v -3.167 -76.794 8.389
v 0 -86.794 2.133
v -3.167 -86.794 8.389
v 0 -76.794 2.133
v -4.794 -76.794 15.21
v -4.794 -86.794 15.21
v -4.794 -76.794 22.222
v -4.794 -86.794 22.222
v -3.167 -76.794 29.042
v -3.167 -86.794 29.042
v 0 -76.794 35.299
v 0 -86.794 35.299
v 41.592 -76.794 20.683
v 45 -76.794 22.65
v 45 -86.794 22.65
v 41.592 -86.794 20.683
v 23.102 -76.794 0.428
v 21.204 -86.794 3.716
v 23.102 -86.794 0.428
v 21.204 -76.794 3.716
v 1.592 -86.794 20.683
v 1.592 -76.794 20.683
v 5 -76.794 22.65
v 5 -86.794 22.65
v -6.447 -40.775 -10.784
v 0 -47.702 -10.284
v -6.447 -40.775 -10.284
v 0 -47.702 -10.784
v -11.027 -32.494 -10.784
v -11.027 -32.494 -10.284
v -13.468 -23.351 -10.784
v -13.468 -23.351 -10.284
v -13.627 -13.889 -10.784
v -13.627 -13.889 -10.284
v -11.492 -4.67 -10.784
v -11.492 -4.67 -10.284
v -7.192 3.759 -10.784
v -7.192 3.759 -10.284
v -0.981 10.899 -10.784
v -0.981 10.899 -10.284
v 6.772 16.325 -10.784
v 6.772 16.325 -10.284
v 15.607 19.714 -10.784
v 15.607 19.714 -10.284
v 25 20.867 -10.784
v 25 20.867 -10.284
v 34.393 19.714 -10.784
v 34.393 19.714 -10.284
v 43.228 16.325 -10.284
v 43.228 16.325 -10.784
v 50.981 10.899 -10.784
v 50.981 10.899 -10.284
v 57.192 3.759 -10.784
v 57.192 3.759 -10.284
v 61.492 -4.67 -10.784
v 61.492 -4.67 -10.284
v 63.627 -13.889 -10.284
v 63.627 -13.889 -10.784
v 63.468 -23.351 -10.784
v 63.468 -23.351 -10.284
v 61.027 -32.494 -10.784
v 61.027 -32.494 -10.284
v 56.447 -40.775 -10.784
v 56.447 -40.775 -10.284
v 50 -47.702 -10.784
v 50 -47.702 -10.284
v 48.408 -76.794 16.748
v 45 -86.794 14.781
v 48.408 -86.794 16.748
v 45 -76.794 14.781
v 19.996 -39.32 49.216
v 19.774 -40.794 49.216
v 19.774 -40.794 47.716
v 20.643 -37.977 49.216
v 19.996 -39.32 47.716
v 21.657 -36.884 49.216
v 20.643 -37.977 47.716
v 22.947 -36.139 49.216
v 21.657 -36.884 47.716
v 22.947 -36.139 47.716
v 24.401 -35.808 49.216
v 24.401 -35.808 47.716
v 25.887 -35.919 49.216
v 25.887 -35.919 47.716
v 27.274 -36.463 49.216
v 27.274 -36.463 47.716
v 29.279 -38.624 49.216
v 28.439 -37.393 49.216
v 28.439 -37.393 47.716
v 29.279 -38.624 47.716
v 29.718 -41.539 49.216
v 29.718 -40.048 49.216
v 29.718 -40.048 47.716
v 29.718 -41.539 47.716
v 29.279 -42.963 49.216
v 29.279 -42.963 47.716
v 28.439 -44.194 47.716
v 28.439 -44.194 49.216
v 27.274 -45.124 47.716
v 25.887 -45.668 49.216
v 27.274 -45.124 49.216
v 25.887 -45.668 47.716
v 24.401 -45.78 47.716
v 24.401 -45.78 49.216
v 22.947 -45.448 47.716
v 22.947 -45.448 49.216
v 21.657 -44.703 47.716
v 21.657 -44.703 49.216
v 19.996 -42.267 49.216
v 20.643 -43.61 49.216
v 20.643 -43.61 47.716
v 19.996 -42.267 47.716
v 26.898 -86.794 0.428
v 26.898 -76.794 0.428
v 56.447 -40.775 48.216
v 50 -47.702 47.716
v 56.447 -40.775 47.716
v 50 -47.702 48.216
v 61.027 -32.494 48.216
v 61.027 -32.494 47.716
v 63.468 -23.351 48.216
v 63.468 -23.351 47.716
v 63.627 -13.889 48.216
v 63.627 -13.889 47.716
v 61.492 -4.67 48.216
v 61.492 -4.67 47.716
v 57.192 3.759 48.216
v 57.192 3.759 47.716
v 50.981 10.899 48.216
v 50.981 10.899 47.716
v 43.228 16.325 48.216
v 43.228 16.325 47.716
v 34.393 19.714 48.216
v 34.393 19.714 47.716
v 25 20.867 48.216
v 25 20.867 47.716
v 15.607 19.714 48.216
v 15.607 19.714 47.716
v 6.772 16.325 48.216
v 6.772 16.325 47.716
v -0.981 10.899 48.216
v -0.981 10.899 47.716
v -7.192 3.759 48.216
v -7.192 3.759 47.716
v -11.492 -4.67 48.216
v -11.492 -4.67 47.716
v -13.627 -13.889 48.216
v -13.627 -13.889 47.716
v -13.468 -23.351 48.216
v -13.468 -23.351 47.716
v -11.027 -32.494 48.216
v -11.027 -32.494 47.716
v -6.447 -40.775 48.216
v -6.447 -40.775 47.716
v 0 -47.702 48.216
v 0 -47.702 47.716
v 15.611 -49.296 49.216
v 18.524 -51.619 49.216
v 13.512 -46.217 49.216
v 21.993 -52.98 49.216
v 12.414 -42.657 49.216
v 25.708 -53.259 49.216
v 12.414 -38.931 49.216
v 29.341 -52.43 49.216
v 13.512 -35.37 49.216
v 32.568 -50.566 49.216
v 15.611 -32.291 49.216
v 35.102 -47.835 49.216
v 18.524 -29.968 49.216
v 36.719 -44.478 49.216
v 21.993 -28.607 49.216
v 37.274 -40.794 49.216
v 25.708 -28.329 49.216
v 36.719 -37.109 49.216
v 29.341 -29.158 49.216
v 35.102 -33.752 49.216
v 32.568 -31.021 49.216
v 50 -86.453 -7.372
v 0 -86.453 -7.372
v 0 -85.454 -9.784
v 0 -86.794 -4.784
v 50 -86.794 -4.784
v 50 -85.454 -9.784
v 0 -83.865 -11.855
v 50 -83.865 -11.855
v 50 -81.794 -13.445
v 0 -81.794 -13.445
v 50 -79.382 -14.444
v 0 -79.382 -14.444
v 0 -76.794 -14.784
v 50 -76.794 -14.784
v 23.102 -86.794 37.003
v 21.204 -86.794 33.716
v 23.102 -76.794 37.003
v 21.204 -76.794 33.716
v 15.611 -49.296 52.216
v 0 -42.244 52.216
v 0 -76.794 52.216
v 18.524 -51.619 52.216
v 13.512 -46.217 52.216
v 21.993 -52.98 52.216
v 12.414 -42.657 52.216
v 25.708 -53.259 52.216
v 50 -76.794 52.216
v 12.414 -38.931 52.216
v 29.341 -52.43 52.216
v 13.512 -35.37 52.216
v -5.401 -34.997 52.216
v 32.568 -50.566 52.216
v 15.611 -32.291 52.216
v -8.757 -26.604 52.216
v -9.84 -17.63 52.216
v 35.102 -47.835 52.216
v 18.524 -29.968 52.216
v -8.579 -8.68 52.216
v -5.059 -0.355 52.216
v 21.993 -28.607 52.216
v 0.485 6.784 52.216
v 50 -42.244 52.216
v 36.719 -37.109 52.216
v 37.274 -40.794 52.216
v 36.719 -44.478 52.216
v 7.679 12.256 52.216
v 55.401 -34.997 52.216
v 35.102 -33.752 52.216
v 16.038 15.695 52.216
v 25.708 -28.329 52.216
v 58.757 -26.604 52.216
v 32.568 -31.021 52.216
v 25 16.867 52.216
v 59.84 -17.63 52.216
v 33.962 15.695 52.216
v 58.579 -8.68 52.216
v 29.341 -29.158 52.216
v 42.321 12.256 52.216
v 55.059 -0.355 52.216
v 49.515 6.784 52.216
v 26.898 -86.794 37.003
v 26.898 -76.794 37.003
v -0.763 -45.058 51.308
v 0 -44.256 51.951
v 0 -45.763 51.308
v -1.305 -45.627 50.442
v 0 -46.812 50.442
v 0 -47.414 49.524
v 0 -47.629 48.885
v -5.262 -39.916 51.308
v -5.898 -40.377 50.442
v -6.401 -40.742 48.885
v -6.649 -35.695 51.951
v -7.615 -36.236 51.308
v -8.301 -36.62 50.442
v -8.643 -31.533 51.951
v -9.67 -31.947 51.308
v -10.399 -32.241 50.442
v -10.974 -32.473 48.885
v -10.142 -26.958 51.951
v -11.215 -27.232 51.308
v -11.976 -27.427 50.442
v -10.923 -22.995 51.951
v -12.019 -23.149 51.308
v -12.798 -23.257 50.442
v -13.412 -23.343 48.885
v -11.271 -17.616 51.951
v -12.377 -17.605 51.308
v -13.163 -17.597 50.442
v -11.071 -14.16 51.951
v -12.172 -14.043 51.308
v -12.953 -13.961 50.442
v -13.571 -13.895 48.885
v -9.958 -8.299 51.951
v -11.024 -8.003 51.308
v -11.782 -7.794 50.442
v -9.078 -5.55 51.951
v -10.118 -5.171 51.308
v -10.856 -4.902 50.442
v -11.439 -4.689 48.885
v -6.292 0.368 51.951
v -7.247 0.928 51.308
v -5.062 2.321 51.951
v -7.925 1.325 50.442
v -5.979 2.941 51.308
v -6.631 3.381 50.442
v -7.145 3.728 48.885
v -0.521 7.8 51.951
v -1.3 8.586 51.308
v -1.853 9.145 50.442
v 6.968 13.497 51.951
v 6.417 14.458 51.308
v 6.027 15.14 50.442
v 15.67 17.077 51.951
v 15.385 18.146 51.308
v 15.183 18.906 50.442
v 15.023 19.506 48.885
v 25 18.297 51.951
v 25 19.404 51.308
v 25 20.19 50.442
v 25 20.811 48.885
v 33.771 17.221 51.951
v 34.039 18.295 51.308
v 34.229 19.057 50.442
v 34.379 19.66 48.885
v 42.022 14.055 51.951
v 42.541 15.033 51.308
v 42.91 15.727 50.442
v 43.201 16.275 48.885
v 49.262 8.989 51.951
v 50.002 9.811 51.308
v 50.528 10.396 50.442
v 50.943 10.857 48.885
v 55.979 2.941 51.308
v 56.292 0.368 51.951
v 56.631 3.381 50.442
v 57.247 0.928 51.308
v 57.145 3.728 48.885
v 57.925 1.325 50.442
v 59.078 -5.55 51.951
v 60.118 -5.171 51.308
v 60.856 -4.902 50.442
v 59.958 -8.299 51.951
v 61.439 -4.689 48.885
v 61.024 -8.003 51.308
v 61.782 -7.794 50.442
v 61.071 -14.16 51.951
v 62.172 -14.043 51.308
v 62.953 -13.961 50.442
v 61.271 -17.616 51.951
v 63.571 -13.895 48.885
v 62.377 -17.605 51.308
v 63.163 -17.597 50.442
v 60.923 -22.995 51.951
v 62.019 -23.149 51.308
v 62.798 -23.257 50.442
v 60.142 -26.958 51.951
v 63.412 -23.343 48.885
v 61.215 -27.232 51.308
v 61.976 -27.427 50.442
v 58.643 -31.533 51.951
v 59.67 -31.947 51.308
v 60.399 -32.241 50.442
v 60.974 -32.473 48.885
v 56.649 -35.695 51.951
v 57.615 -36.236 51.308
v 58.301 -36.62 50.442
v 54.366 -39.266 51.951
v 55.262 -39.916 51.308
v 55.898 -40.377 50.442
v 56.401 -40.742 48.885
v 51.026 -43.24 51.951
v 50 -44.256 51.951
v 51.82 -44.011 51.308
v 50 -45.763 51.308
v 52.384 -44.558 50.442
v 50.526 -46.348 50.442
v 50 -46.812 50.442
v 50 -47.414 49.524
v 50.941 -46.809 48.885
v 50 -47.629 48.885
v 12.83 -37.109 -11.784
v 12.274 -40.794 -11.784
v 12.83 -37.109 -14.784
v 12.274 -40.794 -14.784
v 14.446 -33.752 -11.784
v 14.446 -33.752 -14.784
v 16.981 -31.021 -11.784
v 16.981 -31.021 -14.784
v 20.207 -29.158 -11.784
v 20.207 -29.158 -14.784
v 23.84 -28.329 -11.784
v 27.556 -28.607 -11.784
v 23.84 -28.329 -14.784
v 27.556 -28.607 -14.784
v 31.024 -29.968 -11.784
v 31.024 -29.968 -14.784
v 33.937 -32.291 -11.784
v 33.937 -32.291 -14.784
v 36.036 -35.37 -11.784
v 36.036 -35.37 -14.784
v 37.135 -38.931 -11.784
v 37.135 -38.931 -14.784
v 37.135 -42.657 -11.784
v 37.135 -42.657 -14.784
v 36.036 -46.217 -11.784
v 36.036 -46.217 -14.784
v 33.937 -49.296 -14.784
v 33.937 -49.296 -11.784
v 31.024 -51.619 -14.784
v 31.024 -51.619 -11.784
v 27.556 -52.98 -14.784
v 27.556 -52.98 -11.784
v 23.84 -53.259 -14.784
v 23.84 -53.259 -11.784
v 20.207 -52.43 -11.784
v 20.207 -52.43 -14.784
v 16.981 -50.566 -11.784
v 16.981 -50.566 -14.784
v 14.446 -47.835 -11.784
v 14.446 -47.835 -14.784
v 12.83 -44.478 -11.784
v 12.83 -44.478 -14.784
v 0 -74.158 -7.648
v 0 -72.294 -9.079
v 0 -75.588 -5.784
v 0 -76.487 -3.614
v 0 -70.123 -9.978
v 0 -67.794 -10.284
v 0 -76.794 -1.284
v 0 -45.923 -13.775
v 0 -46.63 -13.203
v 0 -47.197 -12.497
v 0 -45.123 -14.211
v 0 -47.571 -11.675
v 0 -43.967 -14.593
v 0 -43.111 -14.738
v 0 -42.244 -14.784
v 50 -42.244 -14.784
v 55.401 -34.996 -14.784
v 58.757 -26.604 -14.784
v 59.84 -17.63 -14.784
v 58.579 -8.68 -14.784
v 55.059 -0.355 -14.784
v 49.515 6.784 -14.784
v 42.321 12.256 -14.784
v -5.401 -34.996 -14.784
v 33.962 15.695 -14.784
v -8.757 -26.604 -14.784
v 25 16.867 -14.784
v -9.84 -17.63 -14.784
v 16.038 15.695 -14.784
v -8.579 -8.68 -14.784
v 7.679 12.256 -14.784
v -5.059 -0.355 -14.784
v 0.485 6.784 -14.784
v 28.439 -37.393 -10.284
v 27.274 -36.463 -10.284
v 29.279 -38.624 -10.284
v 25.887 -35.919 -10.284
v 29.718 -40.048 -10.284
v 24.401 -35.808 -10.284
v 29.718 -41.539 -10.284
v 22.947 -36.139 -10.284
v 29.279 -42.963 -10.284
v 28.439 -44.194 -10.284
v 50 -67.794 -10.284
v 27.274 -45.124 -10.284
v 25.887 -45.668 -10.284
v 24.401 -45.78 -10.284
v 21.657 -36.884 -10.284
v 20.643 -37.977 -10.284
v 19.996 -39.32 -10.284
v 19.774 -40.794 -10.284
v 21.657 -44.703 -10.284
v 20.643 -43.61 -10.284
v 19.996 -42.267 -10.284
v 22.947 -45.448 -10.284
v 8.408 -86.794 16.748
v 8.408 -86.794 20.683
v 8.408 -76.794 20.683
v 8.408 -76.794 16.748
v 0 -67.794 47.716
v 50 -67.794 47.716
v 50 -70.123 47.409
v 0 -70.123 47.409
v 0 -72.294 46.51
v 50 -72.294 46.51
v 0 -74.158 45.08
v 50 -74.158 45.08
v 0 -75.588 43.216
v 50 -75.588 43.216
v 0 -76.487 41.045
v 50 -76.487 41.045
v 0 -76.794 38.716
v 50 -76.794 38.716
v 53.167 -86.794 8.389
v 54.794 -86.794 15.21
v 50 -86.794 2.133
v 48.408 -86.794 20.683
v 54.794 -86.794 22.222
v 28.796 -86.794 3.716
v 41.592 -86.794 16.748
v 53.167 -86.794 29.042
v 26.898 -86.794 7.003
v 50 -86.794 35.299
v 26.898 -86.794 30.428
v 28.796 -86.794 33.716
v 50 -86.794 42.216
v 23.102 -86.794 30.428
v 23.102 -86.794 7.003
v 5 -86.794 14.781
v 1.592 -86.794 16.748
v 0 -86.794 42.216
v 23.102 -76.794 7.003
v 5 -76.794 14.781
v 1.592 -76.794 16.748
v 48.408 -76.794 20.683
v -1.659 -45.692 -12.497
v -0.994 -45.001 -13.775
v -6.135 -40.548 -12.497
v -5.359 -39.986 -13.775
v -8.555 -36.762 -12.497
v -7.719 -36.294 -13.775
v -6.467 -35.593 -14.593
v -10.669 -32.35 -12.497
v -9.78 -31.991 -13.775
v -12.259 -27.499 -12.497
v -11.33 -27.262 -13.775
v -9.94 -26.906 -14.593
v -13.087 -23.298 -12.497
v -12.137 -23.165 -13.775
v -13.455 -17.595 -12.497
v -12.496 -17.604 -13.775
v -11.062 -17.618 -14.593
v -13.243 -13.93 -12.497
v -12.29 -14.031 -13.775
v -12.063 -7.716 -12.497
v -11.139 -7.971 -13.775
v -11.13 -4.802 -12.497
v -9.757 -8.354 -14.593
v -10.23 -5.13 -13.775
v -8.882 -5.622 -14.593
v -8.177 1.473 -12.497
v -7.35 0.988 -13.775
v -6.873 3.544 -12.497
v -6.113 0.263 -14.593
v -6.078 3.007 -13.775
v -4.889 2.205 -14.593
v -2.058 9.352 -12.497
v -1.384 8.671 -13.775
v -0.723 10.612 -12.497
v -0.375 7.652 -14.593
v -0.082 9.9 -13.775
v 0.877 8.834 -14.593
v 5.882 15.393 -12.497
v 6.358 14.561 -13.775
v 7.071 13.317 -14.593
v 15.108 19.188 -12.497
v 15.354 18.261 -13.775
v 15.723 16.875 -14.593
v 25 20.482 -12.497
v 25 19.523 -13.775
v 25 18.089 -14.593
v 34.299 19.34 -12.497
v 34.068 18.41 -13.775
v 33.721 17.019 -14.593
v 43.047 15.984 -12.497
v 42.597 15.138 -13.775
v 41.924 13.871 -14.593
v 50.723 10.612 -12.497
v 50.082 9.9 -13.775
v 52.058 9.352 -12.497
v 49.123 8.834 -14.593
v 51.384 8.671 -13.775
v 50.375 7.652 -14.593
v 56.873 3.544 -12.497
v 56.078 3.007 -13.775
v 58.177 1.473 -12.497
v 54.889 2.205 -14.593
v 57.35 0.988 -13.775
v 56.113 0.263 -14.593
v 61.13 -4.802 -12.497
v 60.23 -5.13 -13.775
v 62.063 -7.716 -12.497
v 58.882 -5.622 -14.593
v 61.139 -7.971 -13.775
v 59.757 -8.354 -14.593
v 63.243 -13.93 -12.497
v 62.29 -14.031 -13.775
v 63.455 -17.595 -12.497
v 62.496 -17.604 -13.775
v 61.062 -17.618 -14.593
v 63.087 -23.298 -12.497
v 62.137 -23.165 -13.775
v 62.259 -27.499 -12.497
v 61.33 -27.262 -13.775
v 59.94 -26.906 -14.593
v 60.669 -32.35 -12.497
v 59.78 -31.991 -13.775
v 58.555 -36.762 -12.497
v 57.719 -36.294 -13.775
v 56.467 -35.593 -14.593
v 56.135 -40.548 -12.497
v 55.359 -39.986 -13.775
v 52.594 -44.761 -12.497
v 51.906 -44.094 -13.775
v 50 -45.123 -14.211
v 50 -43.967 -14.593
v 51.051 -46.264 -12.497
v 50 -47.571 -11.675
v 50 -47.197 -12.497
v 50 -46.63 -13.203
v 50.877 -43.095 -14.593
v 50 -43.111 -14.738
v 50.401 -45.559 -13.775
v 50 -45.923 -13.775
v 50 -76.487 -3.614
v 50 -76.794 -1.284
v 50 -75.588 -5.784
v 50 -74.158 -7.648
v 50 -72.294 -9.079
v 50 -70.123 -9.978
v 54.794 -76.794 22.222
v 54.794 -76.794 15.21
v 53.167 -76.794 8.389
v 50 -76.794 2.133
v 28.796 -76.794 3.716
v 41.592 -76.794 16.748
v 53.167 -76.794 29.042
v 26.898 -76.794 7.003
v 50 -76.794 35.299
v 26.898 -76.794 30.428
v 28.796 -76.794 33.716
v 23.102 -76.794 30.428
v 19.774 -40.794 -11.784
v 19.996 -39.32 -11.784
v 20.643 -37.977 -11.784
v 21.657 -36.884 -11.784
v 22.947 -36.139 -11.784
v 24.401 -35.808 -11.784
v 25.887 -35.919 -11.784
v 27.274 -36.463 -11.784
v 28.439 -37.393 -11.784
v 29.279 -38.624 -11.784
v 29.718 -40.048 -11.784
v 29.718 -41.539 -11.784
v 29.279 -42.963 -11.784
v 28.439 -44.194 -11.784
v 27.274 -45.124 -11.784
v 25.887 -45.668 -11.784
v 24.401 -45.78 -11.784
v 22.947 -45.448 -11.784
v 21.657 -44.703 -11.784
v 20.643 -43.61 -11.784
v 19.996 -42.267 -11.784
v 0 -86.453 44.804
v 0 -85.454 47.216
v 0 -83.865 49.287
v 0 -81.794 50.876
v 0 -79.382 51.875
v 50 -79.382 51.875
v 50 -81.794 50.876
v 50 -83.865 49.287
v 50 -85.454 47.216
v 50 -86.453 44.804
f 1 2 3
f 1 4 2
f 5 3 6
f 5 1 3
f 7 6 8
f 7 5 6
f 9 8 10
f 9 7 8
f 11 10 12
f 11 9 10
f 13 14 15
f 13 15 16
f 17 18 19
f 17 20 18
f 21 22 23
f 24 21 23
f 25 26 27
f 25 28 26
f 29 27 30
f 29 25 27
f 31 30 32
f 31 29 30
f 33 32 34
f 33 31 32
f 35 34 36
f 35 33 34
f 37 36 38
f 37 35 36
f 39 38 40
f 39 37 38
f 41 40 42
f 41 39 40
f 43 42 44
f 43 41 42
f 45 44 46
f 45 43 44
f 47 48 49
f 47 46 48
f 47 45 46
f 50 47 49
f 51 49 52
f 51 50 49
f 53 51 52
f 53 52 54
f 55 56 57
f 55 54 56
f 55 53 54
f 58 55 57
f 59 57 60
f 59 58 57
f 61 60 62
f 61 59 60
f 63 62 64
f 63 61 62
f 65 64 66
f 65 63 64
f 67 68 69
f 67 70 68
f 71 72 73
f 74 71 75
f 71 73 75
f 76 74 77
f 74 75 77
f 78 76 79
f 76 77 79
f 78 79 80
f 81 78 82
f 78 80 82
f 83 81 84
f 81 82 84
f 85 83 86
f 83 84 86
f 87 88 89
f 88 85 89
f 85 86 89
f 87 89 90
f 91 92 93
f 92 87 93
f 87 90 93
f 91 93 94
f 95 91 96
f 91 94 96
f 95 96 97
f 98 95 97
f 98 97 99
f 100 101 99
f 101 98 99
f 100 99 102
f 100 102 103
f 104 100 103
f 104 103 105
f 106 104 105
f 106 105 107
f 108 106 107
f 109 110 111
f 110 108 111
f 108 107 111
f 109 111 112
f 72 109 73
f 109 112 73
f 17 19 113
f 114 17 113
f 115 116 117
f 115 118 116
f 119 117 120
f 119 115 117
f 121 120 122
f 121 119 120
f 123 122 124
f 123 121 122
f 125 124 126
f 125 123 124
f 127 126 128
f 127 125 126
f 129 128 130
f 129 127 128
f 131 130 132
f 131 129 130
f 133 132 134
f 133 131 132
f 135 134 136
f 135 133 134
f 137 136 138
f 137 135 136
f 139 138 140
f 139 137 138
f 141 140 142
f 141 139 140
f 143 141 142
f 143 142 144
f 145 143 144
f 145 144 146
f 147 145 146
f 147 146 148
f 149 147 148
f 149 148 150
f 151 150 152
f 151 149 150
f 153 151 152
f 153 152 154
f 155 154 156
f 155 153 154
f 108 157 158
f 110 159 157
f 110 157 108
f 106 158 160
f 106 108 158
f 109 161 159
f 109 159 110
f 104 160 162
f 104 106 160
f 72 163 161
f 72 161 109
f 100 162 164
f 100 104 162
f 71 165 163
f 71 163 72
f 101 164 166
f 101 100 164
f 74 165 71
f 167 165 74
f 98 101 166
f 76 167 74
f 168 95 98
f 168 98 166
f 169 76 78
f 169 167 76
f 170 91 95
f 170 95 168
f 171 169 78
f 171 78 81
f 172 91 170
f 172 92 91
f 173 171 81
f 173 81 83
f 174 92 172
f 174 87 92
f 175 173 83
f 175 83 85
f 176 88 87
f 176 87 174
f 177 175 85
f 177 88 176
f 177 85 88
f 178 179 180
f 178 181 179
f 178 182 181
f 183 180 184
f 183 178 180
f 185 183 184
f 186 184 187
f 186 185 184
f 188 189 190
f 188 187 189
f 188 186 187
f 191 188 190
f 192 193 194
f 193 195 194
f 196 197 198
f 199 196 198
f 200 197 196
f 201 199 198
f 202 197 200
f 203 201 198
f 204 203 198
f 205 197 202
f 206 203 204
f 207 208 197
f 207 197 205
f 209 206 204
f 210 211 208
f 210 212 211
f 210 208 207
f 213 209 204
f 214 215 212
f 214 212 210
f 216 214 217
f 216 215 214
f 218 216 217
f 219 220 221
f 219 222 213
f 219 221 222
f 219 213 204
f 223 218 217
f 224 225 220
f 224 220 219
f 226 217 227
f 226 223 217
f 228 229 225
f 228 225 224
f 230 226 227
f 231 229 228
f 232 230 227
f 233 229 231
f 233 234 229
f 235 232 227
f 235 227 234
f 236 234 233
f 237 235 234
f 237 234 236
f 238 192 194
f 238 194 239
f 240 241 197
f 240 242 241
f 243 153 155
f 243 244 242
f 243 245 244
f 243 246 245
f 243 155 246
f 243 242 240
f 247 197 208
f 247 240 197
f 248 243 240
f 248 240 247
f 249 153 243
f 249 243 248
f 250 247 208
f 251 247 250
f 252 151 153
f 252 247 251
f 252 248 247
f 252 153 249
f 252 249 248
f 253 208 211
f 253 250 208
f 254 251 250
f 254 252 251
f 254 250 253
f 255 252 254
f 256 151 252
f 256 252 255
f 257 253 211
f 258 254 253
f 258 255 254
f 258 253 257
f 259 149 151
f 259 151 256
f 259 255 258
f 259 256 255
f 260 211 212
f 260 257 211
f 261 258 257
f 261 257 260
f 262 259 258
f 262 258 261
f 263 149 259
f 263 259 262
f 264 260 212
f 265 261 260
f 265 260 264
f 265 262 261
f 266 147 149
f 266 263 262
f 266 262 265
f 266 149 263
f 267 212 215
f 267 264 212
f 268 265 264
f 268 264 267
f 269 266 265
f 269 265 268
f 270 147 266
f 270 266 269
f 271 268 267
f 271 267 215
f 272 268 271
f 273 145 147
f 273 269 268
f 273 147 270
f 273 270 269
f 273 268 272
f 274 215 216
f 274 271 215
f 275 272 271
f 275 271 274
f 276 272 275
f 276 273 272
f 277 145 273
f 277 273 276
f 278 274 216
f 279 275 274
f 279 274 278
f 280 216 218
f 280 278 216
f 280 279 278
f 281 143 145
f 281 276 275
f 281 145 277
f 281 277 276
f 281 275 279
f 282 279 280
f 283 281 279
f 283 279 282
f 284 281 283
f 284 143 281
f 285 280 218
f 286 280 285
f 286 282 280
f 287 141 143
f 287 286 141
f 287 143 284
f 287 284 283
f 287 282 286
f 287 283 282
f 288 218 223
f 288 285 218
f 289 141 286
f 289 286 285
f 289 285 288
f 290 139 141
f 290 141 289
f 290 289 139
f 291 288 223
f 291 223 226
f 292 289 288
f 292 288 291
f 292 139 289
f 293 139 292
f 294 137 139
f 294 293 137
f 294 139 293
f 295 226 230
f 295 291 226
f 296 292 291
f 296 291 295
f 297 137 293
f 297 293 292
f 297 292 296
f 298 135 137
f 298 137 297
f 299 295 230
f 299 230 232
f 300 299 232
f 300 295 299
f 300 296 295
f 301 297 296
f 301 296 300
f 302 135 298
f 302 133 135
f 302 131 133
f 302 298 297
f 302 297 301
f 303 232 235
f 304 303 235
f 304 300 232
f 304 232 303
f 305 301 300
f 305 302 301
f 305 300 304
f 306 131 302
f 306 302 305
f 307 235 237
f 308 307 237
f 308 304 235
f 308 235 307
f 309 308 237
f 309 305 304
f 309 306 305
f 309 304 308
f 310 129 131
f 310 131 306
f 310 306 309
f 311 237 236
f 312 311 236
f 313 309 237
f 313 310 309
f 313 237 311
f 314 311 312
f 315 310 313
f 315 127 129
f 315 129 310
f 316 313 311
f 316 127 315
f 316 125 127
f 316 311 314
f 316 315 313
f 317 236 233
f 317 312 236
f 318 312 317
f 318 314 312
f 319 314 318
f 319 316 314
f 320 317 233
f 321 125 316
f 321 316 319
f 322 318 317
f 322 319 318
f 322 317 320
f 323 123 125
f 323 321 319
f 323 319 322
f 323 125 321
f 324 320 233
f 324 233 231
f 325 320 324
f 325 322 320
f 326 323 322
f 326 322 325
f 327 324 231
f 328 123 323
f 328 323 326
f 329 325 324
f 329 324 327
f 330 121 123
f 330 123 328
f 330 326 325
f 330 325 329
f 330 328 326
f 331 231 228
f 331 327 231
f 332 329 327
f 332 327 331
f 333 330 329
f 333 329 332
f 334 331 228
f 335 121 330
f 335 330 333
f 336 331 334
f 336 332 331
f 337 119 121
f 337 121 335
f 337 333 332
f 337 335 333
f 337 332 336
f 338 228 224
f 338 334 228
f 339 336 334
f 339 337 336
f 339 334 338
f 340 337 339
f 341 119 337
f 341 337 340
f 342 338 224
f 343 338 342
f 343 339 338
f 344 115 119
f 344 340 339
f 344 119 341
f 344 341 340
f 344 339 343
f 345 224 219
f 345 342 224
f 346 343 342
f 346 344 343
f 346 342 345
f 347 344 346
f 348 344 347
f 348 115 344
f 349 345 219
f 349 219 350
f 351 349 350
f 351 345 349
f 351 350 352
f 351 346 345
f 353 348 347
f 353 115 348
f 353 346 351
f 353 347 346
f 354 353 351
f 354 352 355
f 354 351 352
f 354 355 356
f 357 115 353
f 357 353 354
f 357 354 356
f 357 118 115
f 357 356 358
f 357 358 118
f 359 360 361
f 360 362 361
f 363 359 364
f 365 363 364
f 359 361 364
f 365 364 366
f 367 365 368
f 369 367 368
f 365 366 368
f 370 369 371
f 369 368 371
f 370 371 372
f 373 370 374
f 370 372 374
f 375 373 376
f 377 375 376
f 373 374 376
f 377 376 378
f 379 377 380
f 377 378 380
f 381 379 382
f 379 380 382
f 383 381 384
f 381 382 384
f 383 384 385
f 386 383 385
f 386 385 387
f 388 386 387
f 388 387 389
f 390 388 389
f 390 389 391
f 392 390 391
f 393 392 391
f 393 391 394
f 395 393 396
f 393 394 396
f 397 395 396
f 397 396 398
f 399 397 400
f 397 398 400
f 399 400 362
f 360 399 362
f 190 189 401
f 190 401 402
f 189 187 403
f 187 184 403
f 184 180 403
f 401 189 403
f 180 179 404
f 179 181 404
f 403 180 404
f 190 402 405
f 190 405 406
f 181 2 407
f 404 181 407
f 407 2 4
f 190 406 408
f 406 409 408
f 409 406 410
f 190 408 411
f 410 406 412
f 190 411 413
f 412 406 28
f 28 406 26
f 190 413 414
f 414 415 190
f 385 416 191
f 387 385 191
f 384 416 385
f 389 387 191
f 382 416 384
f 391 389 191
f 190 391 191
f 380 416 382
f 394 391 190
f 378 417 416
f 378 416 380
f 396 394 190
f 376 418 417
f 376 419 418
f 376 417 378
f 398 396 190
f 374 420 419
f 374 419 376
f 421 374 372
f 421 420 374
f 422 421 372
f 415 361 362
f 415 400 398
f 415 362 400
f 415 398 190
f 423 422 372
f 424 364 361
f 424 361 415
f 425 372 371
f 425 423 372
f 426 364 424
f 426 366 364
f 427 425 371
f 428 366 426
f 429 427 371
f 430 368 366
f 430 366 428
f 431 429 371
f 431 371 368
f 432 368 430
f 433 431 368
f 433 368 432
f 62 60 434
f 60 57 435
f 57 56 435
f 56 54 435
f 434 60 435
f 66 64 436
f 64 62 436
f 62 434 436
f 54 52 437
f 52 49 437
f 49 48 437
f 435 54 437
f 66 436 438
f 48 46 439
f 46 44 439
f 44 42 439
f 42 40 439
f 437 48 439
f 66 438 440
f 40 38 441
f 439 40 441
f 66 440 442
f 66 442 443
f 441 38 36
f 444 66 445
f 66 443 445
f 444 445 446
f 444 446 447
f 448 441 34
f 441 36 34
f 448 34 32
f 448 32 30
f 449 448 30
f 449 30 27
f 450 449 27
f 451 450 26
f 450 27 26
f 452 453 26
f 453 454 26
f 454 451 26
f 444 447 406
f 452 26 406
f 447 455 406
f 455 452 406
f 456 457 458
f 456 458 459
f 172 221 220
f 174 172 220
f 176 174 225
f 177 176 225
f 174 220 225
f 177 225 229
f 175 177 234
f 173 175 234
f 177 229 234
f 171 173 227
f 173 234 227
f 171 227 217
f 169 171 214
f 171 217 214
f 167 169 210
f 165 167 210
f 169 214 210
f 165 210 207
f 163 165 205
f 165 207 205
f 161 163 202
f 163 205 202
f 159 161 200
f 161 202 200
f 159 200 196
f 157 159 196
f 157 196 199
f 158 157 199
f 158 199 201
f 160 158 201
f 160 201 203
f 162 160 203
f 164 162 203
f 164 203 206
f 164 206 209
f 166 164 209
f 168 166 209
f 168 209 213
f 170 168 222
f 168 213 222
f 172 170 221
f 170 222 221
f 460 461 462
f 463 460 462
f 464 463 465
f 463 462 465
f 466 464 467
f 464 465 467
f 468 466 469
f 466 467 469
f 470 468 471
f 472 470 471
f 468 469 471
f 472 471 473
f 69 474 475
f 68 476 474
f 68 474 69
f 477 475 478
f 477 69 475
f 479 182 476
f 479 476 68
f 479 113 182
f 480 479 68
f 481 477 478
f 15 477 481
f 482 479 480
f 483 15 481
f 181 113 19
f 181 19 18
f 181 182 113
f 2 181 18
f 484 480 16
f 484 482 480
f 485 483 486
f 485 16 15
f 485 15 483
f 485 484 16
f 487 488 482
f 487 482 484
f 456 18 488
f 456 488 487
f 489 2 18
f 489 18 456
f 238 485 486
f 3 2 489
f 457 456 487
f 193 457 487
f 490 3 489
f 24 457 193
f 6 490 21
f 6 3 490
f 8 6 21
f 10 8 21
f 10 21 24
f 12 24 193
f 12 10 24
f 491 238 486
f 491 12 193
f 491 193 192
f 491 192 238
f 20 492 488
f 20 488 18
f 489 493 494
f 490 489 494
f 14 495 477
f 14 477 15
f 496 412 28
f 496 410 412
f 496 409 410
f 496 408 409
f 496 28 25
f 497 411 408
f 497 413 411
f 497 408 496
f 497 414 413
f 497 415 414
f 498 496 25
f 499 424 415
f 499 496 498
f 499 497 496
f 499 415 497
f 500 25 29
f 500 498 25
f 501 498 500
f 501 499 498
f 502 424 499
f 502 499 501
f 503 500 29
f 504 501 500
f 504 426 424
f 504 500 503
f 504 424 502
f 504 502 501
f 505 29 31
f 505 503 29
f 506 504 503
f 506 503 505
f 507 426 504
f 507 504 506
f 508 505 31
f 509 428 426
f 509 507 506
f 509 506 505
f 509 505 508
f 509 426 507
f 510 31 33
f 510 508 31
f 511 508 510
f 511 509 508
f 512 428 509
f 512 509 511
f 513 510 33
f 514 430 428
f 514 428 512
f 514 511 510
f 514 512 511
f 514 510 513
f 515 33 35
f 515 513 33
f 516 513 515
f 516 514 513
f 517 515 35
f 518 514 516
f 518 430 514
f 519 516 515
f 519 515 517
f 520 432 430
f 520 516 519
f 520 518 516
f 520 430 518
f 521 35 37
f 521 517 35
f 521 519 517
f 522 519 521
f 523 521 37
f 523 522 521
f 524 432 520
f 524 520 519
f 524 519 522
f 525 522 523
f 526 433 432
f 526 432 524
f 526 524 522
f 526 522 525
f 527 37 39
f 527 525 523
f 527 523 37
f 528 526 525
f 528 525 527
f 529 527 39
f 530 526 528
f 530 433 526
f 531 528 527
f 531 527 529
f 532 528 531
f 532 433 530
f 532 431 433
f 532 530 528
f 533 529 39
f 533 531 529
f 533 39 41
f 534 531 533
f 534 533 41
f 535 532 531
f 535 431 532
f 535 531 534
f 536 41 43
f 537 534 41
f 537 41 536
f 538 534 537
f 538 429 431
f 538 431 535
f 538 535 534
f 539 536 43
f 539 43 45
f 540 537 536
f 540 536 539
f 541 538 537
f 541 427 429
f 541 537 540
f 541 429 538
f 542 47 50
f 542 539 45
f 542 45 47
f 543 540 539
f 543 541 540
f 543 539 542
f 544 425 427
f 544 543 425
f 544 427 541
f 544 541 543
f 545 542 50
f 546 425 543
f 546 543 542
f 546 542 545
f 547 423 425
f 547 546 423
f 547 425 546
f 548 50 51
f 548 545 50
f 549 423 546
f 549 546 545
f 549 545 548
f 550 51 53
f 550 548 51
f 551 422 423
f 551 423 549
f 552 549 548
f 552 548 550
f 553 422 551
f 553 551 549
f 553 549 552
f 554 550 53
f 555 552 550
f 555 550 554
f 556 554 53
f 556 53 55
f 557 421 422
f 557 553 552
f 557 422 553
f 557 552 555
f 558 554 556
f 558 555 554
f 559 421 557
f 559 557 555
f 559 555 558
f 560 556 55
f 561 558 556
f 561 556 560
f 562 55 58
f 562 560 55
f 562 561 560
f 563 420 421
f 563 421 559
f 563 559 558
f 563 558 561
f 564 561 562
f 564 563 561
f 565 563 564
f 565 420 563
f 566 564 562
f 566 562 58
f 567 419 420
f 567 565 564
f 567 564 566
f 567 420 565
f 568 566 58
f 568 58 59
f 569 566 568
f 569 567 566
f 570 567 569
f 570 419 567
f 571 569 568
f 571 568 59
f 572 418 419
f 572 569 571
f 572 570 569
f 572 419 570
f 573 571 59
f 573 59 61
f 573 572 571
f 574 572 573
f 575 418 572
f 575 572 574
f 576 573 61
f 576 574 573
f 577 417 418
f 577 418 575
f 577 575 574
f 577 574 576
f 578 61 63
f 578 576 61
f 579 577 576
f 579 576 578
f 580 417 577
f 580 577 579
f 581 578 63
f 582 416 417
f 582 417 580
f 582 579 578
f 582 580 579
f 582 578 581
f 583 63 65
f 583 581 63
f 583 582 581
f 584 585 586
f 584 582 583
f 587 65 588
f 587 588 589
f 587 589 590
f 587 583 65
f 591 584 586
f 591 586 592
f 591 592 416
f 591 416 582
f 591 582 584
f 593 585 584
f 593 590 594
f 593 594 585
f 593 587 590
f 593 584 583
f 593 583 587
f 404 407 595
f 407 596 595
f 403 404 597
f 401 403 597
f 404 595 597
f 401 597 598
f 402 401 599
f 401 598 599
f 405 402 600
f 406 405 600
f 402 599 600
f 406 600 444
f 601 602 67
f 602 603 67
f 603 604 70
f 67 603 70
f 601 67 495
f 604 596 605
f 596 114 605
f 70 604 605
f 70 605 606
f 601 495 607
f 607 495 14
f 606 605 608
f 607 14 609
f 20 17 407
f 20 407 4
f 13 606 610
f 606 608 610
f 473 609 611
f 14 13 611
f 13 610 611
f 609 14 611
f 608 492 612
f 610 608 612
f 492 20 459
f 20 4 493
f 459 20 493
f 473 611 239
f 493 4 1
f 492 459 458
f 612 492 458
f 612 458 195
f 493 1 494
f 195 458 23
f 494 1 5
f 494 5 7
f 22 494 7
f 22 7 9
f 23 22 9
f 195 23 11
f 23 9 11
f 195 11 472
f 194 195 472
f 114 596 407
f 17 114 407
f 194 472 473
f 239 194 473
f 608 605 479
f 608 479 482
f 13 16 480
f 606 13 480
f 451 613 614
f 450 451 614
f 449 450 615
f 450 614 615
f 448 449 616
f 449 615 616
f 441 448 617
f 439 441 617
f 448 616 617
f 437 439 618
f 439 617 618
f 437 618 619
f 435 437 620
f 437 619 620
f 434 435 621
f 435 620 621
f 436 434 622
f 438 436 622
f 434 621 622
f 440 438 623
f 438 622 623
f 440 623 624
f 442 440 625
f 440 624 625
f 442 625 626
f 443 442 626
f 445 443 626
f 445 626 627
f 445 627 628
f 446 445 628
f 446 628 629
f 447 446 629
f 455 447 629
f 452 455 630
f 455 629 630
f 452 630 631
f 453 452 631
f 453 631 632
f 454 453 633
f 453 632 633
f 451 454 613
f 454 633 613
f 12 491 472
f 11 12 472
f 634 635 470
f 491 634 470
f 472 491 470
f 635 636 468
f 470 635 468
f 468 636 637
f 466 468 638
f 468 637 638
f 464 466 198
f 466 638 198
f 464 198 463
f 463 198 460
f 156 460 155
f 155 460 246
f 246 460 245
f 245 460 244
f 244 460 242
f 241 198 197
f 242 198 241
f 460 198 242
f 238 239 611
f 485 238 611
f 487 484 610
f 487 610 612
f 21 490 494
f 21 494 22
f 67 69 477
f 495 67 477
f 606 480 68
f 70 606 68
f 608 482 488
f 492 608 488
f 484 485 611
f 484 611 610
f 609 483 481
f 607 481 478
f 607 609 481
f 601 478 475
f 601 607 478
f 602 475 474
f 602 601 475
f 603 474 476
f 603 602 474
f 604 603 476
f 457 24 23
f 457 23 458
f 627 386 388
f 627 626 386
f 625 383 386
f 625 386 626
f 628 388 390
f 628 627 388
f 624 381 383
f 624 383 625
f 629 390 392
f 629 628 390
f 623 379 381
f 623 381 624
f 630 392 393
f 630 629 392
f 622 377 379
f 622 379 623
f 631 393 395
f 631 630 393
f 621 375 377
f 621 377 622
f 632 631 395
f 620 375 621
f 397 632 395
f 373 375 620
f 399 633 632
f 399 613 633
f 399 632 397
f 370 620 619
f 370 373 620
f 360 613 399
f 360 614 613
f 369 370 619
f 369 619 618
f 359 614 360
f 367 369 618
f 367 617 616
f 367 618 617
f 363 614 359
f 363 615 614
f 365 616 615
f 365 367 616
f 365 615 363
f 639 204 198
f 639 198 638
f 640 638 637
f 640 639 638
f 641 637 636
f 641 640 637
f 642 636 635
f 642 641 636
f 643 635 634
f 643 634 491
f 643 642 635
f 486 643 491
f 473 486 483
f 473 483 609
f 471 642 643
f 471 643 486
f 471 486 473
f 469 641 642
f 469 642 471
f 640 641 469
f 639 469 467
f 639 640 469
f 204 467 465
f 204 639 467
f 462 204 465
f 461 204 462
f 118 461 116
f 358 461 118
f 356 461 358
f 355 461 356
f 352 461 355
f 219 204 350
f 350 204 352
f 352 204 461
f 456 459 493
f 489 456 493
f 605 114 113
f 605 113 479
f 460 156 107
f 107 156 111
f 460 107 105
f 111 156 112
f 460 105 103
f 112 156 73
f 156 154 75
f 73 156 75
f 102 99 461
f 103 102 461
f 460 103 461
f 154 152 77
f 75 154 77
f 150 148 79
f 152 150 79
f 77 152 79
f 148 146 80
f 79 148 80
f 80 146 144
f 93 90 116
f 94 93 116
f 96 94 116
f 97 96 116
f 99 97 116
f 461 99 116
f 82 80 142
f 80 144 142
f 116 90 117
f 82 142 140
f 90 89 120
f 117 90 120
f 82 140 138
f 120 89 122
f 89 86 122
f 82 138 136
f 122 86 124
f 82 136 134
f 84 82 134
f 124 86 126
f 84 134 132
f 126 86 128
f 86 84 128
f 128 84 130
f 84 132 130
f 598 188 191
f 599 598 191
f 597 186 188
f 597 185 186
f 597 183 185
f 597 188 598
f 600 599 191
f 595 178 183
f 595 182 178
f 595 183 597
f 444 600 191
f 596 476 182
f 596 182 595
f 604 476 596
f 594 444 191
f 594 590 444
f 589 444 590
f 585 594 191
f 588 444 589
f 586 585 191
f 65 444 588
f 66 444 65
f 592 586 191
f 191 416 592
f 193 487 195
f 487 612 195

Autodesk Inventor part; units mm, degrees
ref_plane "YZ Plane" through (0, 0, 0) normal (1, 0, 0) x (0, 1, 0)
ref_plane "XZ Plane" through (0, 0, 0) normal (0, 1, 0) x (-1, 0, 0)
sketch "Sketch1" plane through (0, 0, 0) normal (1, 0, 0) x (0, 1, 0)
  line L0 (-26.7936, -14.7843) -> (-86.7936, -14.7843)
  line L1 (-86.7936, -14.7843) -> (-86.7936, 52.2157)
  line L2 (-86.7936, 52.2157) -> (-26.8407, 52.2157)
  line L3 (-26.8407, 52.2157) -> (-26.7466, 47.7157)
  line L4 (-26.7936, -14.7843) -> (-26.7936, -10.2843)
  line L5 (-26.7936, -10.2843) -> (-76.7936, -10.2843)
  line L6 (-76.7936, -10.2843) -> (-76.7936, 47.7157)
  line L7 (-76.7936, 47.7157) -> (-26.7466, 47.7157)
  point P0 (0, 0)
  point P1 (-26.7936, -12.5343)
  point P2 (-26.7936, 49.9657)
  dimension "d0" = 4.5
  dimension "d1" = 4.5
  dimension "d4" = 60
  dimension "d5" = 50
  dimension "d9" = 58
extrude "Extrusion1" add sketch "Sketch1" along normal blind 50
sketch "Sketch2" plane through (0, -76.7936, 47.7157) normal (0, 1, 0) x (1, 0, 0)
  line L0 (0, 58) -> (0, 0) projected
  line L1 (0, 0) -> (50, 0) projected
  line L2 (50, 58) -> (50, 0) projected
  line L3 (0, 58) -> (50, 58) projected
  circle A0 centre (25, 29) radius 30
  point P0 (0, 47.7157)
  dimension "d12" = 60
fillet "Fillet1" radius 9 2 edges at (25, -76.7936, -10.2843) (25, -76.7936, 47.7157)
extrude "Extrusion2" add sketch "Sketch2" against normal blind 10 contours A0 L3 L2 L1 L0 | L0 A0 | A0 L3 | L1 A0 | A0 L2
sketch "Sketch4" plane through (0, -86.7936, -14.7843) normal (0, 0, -1) x (-1, 0, 0)
  line L0 (0, 19) -> (0, 60.047) projected
  line L1 (-50, 59.953) -> (-50, 0) projected
  line L2 (0, 29.9765) -> (-50, 29.9765)
  circle A0 centre (-25, 68.8186) radius 38.8421
  point P0 (0, 86.7936)
  point P1 (-25, 29.9765)
extrude "Extrusion3" add sketch "Sketch4" against normal blind 4.5 contours A0
fillet "Fillet2" radius 4 1 edges at (25, 20.8671, -14.7843)
ref_plane "Work Plane1" through (50, -86.7936, 18.7157) normal (0, 0, -1) x (-1, 0, 0)
fillet "Fillet3" radius 10 1 edges at (25, -86.7936, -14.7843)
sketch "Sketch6" plane through (0, -86.7936, 52.2157) normal (0, 0, 1) x (1, 0, 0)
  line L0 (0, 39.0913) -> (0, 19) projected
  line L1 (50, 19) -> (0, 19) projected
  line L2 (50, 39.0913) -> (50, 19) projected
  arc A0 (50, 39.0913) -> (0, 39.0913) centre (25, 68.8186) ccw projected
  circle A1 centre (25, 68.8186) radius 38.8421
  point P0 (0, 86.7936)
extrude "Extrusion4" add sketch "Sketch6" against normal blind 4.5 contours A0 A1
fillet "Fillet4" radius 10 1 edges at (25, -86.7936, 52.2157)
fillet "Fillet5" radius 4 1 edges at (25, 20.8671, 52.2157)
sketch "Sketch7" plane through (25, -17.975, -14.7843) normal (0, 0, -1) x (-1, 0, 0)
  circle A0 centre (0.2258, -22.8186) radius 5
  line L0 (30, -58.8186) -> (25, -58.8186) projected
  point P0 (25, 17.975)
  dimension "d24" = 36
  dimension "d25" = 10
extrude "Extrusion5" cut sketch "Sketch7" against normal through all
sketch "Sketch8" plane through (25, -17.975, -14.7843) normal (0, 0, -1) x (-1, 0, 0)
  circle A0 centre (0.2258, -22.8186) radius 5 projected
  circle A1 centre (0.2258, -22.8186) radius 12.5
  point P0 (25, 17.975)
  dimension "d28" = 25
extrude "Extrusion6" cut sketch "Sketch8" against normal blind 3
sketch "Sketch9" plane through (0, -76.7936, 52.2157) normal (0, 0, 1) x (1, 0, 0)
  circle A0 centre (24.7742, 36) radius 5 projected
  circle A1 centre (24.7742, 36) radius 12.5 projected
  circle A2 centre (24.7742, 36) radius 12.5
  point P0 (0, 76.7936)
extrude "Extrusion7" cut sketch "Sketch9" against normal blind 3
sketch "Sketch11" plane through (0, -76.7936, 38.7157) normal (0, 1, 0) x (1, 0, 0)
  line L0 (0, 3.4169) -> (0, 0) projected
  line L1 (50, 0) -> (0, 0) projected
  line L2 (50, 3.4169) -> (50, 0) projected
  arc A0 (50, 3.4169) -> (50, 36.5831) centre (25, 20) ccw projected
  line L3 (50, 40) -> (50, 36.5831) projected
  line L4 (0, 40) -> (50, 40) projected
  line L5 (0, 40) -> (0, 36.5831) projected
  arc A1 (0, 36.5831) -> (0, 3.4169) centre (25, 20) ccw projected
  line L6 (0, 40) -> (50, 40) projected
  line L7 (25, 40) -> (25, 0)
  line L8 (-5, 20) -> (55, 20)
  line L9 (26.898, 31.7126) -> (23.102, 31.7126)
  line L10 (23.102, 31.7126) -> (21.204, 35)
  line L11 (21.204, 35) -> (23.102, 38.2874)
  line L12 (23.102, 38.2874) -> (26.898, 38.2874)
  line L13 (26.898, 38.2874) -> (28.796, 35)
  line L14 (28.796, 35) -> (26.898, 31.7126)
  line L15 (48.4075, 18.0327) -> (45, 16.0654)
  line L16 (45, 16.0654) -> (41.5925, 18.0327)
  line L17 (41.5925, 18.0327) -> (41.5925, 21.9673)
  line L18 (41.5925, 21.9673) -> (45, 23.9346)
  line L19 (45, 23.9346) -> (48.4075, 21.9673)
  line L20 (48.4075, 21.9673) -> (48.4075, 18.0327)
  line L21 (26.898, 8.2874) -> (23.102, 8.2874)
  line L22 (23.102, 8.2874) -> (21.204, 5)
  line L23 (21.204, 5) -> (23.102, 1.7126)
  line L24 (23.102, 1.7126) -> (26.898, 1.7126)
  line L25 (26.898, 1.7126) -> (28.796, 5)
  line L26 (28.796, 5) -> (26.898, 8.2874)
  line L27 (1.5925, 18.0327) -> (5, 16.0654)
  line L28 (5, 16.0654) -> (8.4075, 18.0327)
  line L29 (8.4075, 18.0327) -> (8.4075, 21.9673)
  line L30 (8.4075, 21.9673) -> (5, 23.9346)
  line L31 (5, 23.9346) -> (1.5925, 21.9673)
  line L32 (1.5925, 21.9673) -> (1.5925, 18.0327)
  point P0 (0, 38.7157)
  point P1 (25, 35)
  point P2 (25, 20)
  point P3 (45, 20)
  dimension "d43" = 15
  dimension "d44" = 20
extrude "Extrusion9" cut sketch "Sketch11" against normal through all contours L32 L31 L30 L29 L8 | L8 L29 L28 L27 L32 | L24 L23 L22 L21 L7 | L7 L21 L26 L25 L24 | L12 L13 L14 L9 L7 | L7 L9 L10 L11 L12 | L17 L18 L19 L20 L8 | L8 L20 L15 L16 L17
properties part number "task3"
